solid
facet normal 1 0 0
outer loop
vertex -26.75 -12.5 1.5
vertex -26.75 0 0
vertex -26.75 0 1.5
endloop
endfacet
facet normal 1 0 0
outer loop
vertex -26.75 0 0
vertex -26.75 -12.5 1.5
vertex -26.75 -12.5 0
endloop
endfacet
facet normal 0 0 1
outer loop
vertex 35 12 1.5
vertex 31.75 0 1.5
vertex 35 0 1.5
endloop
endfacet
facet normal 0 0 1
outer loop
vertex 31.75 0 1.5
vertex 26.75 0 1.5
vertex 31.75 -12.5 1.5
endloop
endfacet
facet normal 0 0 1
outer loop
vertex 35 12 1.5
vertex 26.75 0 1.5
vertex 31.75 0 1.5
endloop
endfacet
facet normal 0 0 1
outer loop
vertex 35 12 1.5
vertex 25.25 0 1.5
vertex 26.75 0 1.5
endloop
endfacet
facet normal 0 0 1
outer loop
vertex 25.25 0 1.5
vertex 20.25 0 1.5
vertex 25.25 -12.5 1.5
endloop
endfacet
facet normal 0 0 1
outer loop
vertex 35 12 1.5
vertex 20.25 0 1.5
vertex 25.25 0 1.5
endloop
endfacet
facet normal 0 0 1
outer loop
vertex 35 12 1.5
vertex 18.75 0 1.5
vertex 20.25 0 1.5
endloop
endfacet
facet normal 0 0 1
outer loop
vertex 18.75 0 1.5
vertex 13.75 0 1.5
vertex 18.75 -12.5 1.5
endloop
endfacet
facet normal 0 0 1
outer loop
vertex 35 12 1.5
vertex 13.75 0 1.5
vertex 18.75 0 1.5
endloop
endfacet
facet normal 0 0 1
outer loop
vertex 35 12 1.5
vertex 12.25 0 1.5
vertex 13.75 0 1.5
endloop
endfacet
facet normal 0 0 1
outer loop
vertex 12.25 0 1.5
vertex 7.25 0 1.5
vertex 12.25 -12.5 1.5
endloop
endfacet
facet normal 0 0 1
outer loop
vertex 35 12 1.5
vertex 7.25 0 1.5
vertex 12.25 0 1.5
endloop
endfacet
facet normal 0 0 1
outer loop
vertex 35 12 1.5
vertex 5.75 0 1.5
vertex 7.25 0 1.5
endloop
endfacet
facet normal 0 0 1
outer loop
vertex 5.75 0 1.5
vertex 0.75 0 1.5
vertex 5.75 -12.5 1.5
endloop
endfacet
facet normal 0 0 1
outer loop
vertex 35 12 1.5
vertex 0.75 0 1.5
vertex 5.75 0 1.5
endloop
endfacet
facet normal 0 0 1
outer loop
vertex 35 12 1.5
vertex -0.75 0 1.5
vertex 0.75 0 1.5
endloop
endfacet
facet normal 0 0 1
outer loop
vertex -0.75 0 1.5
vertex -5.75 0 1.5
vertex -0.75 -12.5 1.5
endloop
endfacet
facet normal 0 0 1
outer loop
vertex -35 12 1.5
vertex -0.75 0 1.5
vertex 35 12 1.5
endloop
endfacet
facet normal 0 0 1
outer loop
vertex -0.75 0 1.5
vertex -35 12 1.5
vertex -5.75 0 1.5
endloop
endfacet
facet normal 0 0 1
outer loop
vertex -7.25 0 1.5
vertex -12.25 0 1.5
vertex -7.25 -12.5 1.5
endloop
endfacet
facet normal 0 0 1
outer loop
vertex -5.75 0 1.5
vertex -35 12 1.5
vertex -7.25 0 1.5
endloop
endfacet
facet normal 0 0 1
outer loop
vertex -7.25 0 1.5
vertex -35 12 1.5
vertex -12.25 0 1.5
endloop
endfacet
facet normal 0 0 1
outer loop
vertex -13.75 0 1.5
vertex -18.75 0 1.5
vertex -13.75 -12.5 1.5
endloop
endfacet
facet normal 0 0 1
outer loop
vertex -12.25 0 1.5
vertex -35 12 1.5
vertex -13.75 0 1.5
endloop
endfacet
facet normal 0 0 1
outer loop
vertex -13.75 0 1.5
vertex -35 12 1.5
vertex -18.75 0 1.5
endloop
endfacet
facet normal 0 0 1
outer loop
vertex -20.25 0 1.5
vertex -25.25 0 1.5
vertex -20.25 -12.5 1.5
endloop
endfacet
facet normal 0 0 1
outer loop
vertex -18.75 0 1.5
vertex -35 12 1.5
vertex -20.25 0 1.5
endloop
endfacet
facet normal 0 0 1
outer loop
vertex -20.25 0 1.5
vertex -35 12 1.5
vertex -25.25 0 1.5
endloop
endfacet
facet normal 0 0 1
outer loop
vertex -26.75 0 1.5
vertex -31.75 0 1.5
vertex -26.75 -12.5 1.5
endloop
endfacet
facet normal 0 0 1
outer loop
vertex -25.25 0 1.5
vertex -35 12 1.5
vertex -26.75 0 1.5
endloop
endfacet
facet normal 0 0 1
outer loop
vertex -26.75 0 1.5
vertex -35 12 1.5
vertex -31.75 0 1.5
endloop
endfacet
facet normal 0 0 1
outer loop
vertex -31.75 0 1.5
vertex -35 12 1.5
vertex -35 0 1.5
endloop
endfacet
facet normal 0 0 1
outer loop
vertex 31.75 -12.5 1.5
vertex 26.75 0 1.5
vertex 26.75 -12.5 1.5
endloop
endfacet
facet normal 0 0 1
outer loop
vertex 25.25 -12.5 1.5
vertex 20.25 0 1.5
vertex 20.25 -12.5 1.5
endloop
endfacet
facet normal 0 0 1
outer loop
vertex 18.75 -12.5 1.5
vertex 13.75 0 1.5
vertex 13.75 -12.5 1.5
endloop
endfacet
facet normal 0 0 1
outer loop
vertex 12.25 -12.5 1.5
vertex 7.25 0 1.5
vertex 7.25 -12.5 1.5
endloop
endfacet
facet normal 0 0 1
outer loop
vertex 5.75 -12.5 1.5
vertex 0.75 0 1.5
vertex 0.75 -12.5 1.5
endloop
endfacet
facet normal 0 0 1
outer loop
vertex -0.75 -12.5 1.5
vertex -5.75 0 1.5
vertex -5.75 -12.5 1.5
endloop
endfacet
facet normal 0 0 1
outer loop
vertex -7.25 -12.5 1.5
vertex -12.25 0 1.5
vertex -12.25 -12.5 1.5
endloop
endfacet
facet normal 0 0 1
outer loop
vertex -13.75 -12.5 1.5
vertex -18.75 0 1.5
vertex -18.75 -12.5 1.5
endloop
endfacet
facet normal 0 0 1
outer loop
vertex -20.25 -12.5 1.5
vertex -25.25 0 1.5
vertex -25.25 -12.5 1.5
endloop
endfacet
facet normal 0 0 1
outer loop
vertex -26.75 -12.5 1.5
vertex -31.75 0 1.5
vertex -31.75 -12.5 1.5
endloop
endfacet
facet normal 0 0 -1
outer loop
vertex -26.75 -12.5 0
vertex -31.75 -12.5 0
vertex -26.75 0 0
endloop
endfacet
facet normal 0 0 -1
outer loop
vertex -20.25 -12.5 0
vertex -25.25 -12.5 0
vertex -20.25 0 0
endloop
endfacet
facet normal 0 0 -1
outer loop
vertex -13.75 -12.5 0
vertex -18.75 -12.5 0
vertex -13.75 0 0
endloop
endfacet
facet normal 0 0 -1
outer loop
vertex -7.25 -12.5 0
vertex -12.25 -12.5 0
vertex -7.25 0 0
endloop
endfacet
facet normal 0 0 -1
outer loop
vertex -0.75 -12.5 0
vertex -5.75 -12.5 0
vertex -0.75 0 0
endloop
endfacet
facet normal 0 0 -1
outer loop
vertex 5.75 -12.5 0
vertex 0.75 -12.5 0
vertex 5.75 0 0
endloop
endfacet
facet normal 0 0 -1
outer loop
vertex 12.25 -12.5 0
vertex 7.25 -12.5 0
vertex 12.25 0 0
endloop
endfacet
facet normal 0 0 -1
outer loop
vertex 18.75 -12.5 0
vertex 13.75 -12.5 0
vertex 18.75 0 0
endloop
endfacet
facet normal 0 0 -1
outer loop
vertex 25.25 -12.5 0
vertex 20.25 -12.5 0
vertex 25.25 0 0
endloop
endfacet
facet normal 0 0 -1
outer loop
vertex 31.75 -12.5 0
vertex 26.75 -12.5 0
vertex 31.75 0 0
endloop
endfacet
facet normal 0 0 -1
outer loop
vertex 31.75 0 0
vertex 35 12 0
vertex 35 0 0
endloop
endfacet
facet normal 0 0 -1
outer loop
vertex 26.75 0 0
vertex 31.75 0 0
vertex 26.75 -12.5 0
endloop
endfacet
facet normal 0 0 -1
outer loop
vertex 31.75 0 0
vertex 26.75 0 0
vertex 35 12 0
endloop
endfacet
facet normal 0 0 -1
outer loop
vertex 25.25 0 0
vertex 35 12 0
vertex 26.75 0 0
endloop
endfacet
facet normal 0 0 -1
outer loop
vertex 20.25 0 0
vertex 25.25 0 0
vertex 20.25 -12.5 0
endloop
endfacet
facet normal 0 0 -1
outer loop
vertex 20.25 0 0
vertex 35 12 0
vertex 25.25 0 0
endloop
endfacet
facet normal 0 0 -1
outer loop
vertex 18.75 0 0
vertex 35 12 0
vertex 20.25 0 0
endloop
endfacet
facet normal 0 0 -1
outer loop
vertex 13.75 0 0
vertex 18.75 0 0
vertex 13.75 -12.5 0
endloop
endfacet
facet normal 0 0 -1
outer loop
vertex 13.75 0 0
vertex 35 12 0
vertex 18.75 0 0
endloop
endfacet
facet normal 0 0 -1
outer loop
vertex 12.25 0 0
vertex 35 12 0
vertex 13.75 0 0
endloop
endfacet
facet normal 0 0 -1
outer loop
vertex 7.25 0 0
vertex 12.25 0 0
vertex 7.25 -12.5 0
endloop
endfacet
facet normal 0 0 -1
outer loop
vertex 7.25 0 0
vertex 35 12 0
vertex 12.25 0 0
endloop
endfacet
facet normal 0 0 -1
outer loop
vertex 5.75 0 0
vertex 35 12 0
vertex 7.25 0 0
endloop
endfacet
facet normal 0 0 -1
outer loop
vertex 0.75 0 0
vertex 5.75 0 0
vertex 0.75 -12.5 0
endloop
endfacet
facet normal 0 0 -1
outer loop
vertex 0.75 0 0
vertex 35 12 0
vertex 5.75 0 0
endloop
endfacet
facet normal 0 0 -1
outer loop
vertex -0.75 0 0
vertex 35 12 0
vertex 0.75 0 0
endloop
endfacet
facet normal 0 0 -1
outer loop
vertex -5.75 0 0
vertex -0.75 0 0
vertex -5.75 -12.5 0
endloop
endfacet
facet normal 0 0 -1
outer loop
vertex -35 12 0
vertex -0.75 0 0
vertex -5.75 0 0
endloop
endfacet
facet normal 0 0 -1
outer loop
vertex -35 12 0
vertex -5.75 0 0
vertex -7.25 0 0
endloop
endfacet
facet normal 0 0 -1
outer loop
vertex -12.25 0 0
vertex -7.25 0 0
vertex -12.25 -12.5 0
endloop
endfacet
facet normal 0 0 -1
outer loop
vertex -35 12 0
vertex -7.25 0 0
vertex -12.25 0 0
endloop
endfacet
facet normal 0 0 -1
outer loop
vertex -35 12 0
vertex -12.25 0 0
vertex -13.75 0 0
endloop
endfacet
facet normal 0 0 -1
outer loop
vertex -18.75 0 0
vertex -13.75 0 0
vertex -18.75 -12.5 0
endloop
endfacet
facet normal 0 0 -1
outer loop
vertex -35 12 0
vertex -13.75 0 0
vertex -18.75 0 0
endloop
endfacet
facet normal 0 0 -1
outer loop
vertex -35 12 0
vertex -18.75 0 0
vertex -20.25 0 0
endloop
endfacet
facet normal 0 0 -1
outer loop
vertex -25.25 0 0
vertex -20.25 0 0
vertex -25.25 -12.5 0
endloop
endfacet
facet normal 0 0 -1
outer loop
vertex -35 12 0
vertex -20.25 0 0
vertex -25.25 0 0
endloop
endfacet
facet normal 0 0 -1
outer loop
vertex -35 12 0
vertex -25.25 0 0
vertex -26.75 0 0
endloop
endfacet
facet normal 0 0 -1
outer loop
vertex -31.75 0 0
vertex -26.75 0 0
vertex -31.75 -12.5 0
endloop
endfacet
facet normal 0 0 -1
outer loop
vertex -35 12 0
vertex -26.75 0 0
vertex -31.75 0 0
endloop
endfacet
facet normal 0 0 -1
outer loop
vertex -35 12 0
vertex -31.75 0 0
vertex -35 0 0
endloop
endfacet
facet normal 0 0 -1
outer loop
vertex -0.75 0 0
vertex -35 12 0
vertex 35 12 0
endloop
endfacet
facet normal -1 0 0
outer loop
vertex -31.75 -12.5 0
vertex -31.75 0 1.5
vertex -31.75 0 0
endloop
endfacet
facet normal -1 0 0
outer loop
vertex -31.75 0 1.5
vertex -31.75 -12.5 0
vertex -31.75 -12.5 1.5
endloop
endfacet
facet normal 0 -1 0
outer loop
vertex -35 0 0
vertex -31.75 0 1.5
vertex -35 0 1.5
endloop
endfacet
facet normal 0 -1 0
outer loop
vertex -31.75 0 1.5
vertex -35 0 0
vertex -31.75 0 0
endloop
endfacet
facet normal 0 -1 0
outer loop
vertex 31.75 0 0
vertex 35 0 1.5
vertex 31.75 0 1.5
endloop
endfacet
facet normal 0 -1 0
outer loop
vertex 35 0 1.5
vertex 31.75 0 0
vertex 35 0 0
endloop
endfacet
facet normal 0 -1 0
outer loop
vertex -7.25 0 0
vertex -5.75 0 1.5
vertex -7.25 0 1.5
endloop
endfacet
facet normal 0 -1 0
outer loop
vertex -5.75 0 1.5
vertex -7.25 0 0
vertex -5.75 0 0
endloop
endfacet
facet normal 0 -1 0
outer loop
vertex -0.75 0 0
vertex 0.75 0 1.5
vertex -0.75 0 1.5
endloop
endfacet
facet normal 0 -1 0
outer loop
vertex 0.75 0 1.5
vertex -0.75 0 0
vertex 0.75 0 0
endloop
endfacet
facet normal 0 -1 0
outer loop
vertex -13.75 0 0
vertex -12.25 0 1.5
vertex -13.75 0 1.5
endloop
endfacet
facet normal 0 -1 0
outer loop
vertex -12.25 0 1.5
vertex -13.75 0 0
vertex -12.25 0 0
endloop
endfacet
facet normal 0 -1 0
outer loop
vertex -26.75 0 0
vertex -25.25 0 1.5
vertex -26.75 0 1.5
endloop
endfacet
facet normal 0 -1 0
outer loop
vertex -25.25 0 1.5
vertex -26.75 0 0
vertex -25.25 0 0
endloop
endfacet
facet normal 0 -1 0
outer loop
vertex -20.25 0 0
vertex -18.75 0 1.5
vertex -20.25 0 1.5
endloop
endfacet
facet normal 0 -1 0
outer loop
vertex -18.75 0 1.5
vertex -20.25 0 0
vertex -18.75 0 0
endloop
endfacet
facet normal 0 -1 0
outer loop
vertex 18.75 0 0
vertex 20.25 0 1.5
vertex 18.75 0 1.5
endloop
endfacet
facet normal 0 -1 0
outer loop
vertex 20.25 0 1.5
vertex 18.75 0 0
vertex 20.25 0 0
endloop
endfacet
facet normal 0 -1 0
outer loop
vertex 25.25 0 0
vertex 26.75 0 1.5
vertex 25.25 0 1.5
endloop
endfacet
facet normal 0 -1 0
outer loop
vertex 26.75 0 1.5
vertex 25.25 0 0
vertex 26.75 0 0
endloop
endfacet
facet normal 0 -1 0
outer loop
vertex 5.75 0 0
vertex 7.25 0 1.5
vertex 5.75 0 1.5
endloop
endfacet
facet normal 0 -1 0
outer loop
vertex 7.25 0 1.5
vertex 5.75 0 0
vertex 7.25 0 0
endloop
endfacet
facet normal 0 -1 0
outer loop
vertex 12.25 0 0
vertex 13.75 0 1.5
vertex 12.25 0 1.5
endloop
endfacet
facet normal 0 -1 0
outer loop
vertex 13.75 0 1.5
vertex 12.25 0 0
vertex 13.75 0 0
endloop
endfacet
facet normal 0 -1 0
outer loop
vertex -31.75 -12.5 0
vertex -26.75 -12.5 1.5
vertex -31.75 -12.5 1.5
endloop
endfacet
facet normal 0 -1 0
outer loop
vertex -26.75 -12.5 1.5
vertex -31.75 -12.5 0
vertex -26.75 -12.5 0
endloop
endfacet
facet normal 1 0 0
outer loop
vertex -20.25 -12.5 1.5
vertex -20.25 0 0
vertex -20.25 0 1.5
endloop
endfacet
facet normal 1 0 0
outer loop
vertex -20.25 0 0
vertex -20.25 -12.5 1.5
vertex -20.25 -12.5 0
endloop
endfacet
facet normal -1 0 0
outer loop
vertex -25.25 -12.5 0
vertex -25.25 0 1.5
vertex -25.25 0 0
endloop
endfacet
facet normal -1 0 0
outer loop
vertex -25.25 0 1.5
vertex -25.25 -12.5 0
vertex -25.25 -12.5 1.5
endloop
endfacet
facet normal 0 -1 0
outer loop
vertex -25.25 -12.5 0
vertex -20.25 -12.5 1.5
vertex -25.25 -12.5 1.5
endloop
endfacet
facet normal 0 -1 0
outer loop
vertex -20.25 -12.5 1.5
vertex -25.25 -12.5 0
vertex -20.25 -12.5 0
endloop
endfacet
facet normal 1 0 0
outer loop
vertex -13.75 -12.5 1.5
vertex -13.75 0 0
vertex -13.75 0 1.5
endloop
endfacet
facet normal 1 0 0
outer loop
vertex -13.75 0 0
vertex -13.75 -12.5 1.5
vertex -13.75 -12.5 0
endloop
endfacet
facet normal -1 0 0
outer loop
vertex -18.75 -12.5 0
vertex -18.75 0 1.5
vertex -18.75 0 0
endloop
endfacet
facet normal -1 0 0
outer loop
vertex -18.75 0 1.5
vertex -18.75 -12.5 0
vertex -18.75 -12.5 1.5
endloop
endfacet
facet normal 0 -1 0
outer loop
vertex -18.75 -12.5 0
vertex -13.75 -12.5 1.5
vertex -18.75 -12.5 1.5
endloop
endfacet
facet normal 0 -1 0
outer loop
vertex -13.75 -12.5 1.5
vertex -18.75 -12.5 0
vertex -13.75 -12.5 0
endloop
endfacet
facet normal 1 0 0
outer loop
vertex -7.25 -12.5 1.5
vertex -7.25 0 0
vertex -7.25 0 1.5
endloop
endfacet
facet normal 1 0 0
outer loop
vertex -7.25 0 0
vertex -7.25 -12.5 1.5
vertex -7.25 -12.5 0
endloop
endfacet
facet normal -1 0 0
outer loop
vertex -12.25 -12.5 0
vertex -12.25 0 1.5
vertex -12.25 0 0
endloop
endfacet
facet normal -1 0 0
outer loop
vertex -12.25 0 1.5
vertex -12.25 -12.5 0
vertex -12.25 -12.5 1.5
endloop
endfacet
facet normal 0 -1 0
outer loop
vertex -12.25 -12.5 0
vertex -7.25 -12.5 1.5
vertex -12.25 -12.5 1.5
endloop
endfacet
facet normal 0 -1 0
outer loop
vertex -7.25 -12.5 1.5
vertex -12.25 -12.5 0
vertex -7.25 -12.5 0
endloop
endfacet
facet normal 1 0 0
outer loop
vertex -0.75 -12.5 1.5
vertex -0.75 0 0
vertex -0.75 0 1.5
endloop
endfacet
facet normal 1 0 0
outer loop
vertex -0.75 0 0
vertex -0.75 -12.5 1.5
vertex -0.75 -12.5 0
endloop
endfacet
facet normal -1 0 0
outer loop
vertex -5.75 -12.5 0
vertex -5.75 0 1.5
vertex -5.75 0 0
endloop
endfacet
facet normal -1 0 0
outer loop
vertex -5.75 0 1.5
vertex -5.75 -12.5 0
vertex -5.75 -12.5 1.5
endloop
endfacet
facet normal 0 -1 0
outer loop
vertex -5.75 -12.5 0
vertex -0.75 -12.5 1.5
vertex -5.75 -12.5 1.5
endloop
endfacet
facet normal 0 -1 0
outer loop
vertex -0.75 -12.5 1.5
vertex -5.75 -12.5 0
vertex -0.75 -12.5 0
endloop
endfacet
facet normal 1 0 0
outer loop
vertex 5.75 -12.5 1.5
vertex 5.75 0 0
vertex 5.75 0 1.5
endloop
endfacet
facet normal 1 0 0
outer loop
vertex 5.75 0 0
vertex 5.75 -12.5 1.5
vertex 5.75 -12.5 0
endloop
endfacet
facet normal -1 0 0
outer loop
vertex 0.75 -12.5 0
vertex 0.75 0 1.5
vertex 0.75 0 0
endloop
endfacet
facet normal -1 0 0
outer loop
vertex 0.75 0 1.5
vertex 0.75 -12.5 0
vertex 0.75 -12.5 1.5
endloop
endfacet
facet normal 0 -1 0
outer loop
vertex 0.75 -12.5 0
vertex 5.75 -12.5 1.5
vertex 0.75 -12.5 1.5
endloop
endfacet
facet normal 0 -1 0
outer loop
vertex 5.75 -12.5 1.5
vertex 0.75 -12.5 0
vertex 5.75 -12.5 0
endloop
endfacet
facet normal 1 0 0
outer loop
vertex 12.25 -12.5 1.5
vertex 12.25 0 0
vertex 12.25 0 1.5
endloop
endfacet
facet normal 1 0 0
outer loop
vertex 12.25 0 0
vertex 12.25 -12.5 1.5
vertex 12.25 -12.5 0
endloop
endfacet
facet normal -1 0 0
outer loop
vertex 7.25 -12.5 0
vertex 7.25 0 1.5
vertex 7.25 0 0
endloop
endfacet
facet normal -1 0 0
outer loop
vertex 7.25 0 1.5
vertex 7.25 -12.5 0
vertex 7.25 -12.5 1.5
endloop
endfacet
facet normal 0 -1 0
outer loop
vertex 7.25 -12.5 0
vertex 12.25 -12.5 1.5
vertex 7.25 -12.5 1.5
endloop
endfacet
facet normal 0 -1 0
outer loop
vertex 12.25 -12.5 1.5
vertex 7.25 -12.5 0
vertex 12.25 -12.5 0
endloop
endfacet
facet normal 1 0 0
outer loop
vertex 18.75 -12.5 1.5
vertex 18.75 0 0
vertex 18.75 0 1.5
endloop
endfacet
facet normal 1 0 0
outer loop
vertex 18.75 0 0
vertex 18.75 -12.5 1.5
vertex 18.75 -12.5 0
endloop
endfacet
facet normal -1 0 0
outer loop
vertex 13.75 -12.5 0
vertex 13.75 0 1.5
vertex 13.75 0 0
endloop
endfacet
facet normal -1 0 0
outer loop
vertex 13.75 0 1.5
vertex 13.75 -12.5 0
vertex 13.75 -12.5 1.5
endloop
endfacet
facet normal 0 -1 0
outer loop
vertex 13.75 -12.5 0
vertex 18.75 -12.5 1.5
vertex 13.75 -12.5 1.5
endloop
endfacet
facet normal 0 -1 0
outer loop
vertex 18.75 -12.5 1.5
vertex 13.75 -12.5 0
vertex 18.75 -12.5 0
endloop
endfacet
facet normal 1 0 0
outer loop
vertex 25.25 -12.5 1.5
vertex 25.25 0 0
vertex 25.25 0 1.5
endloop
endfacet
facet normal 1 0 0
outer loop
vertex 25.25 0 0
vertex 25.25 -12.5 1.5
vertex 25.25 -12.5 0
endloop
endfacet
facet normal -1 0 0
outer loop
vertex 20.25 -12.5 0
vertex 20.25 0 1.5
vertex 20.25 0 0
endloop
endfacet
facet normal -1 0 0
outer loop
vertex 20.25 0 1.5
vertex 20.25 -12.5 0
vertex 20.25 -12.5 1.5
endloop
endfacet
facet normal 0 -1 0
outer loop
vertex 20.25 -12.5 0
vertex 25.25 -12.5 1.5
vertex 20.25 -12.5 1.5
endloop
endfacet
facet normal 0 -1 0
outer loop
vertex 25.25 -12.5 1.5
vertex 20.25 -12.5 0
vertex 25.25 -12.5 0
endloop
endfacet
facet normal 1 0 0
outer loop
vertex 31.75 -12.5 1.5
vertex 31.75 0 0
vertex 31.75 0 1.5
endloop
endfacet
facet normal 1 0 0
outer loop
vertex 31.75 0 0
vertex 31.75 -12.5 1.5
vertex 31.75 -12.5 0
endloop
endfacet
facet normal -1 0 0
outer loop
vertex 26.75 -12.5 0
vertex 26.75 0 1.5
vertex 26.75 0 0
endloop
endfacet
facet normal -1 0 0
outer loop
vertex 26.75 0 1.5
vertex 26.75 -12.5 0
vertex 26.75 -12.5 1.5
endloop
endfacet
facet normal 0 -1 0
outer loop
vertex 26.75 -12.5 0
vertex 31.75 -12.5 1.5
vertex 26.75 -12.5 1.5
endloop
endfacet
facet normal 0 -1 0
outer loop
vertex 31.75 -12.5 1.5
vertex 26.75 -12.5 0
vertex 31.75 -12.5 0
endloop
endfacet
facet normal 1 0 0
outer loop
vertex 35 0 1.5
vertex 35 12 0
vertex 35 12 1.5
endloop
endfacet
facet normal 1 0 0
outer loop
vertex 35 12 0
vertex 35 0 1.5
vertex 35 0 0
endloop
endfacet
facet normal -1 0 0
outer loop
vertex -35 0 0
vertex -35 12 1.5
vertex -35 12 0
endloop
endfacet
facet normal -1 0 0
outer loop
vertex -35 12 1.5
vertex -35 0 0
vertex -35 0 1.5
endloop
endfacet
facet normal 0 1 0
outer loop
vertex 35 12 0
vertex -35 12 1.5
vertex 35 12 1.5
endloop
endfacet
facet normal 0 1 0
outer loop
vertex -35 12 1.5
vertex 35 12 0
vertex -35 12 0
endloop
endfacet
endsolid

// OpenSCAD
// 10-well comb for casting agarose gels
// Print orientation: flat on bed, spine (back bar) along +X, teeth hanging in -Y

// ---------- Parameters ----------
spine_len      = 70;    // spine length along X (mm)
spine_w        = 12;    // spine width along Y (mm)
plate_t        = 1.5;   // plate thickness along Z (mm)

tooth_count    = 10;    // number of teeth
tooth_w        = 5.0;   // tooth width along X (mm)
tooth_len      = 12;    // tooth length along Y (mm)
tooth_gap      = 1.5;   // gap between neighbouring teeth (mm)

eps            = 0.5;   // cutter overshoot past faces (mm)

$fn = 64;

// ---------- Derived ----------
pitch   = tooth_w + tooth_gap;            // centre-to-centre tooth spacing
x_start = -(tooth_count - 1) * pitch / 2; // first tooth centre, row centred on spine

// ---------- Model ----------
union() {
    // Spine (back bar)
    translate([-spine_len / 2, 0, 0])
        cube([spine_len, spine_w, plate_t]);

    // Teeth hanging in -Y from the spine's long edge
    for (i = [0 : tooth_count - 1])
        translate([x_start + i * pitch - tooth_w / 2,
                   -tooth_len - eps,
                   0])
            cube([tooth_w, tooth_len + eps, plate_t]);
}
